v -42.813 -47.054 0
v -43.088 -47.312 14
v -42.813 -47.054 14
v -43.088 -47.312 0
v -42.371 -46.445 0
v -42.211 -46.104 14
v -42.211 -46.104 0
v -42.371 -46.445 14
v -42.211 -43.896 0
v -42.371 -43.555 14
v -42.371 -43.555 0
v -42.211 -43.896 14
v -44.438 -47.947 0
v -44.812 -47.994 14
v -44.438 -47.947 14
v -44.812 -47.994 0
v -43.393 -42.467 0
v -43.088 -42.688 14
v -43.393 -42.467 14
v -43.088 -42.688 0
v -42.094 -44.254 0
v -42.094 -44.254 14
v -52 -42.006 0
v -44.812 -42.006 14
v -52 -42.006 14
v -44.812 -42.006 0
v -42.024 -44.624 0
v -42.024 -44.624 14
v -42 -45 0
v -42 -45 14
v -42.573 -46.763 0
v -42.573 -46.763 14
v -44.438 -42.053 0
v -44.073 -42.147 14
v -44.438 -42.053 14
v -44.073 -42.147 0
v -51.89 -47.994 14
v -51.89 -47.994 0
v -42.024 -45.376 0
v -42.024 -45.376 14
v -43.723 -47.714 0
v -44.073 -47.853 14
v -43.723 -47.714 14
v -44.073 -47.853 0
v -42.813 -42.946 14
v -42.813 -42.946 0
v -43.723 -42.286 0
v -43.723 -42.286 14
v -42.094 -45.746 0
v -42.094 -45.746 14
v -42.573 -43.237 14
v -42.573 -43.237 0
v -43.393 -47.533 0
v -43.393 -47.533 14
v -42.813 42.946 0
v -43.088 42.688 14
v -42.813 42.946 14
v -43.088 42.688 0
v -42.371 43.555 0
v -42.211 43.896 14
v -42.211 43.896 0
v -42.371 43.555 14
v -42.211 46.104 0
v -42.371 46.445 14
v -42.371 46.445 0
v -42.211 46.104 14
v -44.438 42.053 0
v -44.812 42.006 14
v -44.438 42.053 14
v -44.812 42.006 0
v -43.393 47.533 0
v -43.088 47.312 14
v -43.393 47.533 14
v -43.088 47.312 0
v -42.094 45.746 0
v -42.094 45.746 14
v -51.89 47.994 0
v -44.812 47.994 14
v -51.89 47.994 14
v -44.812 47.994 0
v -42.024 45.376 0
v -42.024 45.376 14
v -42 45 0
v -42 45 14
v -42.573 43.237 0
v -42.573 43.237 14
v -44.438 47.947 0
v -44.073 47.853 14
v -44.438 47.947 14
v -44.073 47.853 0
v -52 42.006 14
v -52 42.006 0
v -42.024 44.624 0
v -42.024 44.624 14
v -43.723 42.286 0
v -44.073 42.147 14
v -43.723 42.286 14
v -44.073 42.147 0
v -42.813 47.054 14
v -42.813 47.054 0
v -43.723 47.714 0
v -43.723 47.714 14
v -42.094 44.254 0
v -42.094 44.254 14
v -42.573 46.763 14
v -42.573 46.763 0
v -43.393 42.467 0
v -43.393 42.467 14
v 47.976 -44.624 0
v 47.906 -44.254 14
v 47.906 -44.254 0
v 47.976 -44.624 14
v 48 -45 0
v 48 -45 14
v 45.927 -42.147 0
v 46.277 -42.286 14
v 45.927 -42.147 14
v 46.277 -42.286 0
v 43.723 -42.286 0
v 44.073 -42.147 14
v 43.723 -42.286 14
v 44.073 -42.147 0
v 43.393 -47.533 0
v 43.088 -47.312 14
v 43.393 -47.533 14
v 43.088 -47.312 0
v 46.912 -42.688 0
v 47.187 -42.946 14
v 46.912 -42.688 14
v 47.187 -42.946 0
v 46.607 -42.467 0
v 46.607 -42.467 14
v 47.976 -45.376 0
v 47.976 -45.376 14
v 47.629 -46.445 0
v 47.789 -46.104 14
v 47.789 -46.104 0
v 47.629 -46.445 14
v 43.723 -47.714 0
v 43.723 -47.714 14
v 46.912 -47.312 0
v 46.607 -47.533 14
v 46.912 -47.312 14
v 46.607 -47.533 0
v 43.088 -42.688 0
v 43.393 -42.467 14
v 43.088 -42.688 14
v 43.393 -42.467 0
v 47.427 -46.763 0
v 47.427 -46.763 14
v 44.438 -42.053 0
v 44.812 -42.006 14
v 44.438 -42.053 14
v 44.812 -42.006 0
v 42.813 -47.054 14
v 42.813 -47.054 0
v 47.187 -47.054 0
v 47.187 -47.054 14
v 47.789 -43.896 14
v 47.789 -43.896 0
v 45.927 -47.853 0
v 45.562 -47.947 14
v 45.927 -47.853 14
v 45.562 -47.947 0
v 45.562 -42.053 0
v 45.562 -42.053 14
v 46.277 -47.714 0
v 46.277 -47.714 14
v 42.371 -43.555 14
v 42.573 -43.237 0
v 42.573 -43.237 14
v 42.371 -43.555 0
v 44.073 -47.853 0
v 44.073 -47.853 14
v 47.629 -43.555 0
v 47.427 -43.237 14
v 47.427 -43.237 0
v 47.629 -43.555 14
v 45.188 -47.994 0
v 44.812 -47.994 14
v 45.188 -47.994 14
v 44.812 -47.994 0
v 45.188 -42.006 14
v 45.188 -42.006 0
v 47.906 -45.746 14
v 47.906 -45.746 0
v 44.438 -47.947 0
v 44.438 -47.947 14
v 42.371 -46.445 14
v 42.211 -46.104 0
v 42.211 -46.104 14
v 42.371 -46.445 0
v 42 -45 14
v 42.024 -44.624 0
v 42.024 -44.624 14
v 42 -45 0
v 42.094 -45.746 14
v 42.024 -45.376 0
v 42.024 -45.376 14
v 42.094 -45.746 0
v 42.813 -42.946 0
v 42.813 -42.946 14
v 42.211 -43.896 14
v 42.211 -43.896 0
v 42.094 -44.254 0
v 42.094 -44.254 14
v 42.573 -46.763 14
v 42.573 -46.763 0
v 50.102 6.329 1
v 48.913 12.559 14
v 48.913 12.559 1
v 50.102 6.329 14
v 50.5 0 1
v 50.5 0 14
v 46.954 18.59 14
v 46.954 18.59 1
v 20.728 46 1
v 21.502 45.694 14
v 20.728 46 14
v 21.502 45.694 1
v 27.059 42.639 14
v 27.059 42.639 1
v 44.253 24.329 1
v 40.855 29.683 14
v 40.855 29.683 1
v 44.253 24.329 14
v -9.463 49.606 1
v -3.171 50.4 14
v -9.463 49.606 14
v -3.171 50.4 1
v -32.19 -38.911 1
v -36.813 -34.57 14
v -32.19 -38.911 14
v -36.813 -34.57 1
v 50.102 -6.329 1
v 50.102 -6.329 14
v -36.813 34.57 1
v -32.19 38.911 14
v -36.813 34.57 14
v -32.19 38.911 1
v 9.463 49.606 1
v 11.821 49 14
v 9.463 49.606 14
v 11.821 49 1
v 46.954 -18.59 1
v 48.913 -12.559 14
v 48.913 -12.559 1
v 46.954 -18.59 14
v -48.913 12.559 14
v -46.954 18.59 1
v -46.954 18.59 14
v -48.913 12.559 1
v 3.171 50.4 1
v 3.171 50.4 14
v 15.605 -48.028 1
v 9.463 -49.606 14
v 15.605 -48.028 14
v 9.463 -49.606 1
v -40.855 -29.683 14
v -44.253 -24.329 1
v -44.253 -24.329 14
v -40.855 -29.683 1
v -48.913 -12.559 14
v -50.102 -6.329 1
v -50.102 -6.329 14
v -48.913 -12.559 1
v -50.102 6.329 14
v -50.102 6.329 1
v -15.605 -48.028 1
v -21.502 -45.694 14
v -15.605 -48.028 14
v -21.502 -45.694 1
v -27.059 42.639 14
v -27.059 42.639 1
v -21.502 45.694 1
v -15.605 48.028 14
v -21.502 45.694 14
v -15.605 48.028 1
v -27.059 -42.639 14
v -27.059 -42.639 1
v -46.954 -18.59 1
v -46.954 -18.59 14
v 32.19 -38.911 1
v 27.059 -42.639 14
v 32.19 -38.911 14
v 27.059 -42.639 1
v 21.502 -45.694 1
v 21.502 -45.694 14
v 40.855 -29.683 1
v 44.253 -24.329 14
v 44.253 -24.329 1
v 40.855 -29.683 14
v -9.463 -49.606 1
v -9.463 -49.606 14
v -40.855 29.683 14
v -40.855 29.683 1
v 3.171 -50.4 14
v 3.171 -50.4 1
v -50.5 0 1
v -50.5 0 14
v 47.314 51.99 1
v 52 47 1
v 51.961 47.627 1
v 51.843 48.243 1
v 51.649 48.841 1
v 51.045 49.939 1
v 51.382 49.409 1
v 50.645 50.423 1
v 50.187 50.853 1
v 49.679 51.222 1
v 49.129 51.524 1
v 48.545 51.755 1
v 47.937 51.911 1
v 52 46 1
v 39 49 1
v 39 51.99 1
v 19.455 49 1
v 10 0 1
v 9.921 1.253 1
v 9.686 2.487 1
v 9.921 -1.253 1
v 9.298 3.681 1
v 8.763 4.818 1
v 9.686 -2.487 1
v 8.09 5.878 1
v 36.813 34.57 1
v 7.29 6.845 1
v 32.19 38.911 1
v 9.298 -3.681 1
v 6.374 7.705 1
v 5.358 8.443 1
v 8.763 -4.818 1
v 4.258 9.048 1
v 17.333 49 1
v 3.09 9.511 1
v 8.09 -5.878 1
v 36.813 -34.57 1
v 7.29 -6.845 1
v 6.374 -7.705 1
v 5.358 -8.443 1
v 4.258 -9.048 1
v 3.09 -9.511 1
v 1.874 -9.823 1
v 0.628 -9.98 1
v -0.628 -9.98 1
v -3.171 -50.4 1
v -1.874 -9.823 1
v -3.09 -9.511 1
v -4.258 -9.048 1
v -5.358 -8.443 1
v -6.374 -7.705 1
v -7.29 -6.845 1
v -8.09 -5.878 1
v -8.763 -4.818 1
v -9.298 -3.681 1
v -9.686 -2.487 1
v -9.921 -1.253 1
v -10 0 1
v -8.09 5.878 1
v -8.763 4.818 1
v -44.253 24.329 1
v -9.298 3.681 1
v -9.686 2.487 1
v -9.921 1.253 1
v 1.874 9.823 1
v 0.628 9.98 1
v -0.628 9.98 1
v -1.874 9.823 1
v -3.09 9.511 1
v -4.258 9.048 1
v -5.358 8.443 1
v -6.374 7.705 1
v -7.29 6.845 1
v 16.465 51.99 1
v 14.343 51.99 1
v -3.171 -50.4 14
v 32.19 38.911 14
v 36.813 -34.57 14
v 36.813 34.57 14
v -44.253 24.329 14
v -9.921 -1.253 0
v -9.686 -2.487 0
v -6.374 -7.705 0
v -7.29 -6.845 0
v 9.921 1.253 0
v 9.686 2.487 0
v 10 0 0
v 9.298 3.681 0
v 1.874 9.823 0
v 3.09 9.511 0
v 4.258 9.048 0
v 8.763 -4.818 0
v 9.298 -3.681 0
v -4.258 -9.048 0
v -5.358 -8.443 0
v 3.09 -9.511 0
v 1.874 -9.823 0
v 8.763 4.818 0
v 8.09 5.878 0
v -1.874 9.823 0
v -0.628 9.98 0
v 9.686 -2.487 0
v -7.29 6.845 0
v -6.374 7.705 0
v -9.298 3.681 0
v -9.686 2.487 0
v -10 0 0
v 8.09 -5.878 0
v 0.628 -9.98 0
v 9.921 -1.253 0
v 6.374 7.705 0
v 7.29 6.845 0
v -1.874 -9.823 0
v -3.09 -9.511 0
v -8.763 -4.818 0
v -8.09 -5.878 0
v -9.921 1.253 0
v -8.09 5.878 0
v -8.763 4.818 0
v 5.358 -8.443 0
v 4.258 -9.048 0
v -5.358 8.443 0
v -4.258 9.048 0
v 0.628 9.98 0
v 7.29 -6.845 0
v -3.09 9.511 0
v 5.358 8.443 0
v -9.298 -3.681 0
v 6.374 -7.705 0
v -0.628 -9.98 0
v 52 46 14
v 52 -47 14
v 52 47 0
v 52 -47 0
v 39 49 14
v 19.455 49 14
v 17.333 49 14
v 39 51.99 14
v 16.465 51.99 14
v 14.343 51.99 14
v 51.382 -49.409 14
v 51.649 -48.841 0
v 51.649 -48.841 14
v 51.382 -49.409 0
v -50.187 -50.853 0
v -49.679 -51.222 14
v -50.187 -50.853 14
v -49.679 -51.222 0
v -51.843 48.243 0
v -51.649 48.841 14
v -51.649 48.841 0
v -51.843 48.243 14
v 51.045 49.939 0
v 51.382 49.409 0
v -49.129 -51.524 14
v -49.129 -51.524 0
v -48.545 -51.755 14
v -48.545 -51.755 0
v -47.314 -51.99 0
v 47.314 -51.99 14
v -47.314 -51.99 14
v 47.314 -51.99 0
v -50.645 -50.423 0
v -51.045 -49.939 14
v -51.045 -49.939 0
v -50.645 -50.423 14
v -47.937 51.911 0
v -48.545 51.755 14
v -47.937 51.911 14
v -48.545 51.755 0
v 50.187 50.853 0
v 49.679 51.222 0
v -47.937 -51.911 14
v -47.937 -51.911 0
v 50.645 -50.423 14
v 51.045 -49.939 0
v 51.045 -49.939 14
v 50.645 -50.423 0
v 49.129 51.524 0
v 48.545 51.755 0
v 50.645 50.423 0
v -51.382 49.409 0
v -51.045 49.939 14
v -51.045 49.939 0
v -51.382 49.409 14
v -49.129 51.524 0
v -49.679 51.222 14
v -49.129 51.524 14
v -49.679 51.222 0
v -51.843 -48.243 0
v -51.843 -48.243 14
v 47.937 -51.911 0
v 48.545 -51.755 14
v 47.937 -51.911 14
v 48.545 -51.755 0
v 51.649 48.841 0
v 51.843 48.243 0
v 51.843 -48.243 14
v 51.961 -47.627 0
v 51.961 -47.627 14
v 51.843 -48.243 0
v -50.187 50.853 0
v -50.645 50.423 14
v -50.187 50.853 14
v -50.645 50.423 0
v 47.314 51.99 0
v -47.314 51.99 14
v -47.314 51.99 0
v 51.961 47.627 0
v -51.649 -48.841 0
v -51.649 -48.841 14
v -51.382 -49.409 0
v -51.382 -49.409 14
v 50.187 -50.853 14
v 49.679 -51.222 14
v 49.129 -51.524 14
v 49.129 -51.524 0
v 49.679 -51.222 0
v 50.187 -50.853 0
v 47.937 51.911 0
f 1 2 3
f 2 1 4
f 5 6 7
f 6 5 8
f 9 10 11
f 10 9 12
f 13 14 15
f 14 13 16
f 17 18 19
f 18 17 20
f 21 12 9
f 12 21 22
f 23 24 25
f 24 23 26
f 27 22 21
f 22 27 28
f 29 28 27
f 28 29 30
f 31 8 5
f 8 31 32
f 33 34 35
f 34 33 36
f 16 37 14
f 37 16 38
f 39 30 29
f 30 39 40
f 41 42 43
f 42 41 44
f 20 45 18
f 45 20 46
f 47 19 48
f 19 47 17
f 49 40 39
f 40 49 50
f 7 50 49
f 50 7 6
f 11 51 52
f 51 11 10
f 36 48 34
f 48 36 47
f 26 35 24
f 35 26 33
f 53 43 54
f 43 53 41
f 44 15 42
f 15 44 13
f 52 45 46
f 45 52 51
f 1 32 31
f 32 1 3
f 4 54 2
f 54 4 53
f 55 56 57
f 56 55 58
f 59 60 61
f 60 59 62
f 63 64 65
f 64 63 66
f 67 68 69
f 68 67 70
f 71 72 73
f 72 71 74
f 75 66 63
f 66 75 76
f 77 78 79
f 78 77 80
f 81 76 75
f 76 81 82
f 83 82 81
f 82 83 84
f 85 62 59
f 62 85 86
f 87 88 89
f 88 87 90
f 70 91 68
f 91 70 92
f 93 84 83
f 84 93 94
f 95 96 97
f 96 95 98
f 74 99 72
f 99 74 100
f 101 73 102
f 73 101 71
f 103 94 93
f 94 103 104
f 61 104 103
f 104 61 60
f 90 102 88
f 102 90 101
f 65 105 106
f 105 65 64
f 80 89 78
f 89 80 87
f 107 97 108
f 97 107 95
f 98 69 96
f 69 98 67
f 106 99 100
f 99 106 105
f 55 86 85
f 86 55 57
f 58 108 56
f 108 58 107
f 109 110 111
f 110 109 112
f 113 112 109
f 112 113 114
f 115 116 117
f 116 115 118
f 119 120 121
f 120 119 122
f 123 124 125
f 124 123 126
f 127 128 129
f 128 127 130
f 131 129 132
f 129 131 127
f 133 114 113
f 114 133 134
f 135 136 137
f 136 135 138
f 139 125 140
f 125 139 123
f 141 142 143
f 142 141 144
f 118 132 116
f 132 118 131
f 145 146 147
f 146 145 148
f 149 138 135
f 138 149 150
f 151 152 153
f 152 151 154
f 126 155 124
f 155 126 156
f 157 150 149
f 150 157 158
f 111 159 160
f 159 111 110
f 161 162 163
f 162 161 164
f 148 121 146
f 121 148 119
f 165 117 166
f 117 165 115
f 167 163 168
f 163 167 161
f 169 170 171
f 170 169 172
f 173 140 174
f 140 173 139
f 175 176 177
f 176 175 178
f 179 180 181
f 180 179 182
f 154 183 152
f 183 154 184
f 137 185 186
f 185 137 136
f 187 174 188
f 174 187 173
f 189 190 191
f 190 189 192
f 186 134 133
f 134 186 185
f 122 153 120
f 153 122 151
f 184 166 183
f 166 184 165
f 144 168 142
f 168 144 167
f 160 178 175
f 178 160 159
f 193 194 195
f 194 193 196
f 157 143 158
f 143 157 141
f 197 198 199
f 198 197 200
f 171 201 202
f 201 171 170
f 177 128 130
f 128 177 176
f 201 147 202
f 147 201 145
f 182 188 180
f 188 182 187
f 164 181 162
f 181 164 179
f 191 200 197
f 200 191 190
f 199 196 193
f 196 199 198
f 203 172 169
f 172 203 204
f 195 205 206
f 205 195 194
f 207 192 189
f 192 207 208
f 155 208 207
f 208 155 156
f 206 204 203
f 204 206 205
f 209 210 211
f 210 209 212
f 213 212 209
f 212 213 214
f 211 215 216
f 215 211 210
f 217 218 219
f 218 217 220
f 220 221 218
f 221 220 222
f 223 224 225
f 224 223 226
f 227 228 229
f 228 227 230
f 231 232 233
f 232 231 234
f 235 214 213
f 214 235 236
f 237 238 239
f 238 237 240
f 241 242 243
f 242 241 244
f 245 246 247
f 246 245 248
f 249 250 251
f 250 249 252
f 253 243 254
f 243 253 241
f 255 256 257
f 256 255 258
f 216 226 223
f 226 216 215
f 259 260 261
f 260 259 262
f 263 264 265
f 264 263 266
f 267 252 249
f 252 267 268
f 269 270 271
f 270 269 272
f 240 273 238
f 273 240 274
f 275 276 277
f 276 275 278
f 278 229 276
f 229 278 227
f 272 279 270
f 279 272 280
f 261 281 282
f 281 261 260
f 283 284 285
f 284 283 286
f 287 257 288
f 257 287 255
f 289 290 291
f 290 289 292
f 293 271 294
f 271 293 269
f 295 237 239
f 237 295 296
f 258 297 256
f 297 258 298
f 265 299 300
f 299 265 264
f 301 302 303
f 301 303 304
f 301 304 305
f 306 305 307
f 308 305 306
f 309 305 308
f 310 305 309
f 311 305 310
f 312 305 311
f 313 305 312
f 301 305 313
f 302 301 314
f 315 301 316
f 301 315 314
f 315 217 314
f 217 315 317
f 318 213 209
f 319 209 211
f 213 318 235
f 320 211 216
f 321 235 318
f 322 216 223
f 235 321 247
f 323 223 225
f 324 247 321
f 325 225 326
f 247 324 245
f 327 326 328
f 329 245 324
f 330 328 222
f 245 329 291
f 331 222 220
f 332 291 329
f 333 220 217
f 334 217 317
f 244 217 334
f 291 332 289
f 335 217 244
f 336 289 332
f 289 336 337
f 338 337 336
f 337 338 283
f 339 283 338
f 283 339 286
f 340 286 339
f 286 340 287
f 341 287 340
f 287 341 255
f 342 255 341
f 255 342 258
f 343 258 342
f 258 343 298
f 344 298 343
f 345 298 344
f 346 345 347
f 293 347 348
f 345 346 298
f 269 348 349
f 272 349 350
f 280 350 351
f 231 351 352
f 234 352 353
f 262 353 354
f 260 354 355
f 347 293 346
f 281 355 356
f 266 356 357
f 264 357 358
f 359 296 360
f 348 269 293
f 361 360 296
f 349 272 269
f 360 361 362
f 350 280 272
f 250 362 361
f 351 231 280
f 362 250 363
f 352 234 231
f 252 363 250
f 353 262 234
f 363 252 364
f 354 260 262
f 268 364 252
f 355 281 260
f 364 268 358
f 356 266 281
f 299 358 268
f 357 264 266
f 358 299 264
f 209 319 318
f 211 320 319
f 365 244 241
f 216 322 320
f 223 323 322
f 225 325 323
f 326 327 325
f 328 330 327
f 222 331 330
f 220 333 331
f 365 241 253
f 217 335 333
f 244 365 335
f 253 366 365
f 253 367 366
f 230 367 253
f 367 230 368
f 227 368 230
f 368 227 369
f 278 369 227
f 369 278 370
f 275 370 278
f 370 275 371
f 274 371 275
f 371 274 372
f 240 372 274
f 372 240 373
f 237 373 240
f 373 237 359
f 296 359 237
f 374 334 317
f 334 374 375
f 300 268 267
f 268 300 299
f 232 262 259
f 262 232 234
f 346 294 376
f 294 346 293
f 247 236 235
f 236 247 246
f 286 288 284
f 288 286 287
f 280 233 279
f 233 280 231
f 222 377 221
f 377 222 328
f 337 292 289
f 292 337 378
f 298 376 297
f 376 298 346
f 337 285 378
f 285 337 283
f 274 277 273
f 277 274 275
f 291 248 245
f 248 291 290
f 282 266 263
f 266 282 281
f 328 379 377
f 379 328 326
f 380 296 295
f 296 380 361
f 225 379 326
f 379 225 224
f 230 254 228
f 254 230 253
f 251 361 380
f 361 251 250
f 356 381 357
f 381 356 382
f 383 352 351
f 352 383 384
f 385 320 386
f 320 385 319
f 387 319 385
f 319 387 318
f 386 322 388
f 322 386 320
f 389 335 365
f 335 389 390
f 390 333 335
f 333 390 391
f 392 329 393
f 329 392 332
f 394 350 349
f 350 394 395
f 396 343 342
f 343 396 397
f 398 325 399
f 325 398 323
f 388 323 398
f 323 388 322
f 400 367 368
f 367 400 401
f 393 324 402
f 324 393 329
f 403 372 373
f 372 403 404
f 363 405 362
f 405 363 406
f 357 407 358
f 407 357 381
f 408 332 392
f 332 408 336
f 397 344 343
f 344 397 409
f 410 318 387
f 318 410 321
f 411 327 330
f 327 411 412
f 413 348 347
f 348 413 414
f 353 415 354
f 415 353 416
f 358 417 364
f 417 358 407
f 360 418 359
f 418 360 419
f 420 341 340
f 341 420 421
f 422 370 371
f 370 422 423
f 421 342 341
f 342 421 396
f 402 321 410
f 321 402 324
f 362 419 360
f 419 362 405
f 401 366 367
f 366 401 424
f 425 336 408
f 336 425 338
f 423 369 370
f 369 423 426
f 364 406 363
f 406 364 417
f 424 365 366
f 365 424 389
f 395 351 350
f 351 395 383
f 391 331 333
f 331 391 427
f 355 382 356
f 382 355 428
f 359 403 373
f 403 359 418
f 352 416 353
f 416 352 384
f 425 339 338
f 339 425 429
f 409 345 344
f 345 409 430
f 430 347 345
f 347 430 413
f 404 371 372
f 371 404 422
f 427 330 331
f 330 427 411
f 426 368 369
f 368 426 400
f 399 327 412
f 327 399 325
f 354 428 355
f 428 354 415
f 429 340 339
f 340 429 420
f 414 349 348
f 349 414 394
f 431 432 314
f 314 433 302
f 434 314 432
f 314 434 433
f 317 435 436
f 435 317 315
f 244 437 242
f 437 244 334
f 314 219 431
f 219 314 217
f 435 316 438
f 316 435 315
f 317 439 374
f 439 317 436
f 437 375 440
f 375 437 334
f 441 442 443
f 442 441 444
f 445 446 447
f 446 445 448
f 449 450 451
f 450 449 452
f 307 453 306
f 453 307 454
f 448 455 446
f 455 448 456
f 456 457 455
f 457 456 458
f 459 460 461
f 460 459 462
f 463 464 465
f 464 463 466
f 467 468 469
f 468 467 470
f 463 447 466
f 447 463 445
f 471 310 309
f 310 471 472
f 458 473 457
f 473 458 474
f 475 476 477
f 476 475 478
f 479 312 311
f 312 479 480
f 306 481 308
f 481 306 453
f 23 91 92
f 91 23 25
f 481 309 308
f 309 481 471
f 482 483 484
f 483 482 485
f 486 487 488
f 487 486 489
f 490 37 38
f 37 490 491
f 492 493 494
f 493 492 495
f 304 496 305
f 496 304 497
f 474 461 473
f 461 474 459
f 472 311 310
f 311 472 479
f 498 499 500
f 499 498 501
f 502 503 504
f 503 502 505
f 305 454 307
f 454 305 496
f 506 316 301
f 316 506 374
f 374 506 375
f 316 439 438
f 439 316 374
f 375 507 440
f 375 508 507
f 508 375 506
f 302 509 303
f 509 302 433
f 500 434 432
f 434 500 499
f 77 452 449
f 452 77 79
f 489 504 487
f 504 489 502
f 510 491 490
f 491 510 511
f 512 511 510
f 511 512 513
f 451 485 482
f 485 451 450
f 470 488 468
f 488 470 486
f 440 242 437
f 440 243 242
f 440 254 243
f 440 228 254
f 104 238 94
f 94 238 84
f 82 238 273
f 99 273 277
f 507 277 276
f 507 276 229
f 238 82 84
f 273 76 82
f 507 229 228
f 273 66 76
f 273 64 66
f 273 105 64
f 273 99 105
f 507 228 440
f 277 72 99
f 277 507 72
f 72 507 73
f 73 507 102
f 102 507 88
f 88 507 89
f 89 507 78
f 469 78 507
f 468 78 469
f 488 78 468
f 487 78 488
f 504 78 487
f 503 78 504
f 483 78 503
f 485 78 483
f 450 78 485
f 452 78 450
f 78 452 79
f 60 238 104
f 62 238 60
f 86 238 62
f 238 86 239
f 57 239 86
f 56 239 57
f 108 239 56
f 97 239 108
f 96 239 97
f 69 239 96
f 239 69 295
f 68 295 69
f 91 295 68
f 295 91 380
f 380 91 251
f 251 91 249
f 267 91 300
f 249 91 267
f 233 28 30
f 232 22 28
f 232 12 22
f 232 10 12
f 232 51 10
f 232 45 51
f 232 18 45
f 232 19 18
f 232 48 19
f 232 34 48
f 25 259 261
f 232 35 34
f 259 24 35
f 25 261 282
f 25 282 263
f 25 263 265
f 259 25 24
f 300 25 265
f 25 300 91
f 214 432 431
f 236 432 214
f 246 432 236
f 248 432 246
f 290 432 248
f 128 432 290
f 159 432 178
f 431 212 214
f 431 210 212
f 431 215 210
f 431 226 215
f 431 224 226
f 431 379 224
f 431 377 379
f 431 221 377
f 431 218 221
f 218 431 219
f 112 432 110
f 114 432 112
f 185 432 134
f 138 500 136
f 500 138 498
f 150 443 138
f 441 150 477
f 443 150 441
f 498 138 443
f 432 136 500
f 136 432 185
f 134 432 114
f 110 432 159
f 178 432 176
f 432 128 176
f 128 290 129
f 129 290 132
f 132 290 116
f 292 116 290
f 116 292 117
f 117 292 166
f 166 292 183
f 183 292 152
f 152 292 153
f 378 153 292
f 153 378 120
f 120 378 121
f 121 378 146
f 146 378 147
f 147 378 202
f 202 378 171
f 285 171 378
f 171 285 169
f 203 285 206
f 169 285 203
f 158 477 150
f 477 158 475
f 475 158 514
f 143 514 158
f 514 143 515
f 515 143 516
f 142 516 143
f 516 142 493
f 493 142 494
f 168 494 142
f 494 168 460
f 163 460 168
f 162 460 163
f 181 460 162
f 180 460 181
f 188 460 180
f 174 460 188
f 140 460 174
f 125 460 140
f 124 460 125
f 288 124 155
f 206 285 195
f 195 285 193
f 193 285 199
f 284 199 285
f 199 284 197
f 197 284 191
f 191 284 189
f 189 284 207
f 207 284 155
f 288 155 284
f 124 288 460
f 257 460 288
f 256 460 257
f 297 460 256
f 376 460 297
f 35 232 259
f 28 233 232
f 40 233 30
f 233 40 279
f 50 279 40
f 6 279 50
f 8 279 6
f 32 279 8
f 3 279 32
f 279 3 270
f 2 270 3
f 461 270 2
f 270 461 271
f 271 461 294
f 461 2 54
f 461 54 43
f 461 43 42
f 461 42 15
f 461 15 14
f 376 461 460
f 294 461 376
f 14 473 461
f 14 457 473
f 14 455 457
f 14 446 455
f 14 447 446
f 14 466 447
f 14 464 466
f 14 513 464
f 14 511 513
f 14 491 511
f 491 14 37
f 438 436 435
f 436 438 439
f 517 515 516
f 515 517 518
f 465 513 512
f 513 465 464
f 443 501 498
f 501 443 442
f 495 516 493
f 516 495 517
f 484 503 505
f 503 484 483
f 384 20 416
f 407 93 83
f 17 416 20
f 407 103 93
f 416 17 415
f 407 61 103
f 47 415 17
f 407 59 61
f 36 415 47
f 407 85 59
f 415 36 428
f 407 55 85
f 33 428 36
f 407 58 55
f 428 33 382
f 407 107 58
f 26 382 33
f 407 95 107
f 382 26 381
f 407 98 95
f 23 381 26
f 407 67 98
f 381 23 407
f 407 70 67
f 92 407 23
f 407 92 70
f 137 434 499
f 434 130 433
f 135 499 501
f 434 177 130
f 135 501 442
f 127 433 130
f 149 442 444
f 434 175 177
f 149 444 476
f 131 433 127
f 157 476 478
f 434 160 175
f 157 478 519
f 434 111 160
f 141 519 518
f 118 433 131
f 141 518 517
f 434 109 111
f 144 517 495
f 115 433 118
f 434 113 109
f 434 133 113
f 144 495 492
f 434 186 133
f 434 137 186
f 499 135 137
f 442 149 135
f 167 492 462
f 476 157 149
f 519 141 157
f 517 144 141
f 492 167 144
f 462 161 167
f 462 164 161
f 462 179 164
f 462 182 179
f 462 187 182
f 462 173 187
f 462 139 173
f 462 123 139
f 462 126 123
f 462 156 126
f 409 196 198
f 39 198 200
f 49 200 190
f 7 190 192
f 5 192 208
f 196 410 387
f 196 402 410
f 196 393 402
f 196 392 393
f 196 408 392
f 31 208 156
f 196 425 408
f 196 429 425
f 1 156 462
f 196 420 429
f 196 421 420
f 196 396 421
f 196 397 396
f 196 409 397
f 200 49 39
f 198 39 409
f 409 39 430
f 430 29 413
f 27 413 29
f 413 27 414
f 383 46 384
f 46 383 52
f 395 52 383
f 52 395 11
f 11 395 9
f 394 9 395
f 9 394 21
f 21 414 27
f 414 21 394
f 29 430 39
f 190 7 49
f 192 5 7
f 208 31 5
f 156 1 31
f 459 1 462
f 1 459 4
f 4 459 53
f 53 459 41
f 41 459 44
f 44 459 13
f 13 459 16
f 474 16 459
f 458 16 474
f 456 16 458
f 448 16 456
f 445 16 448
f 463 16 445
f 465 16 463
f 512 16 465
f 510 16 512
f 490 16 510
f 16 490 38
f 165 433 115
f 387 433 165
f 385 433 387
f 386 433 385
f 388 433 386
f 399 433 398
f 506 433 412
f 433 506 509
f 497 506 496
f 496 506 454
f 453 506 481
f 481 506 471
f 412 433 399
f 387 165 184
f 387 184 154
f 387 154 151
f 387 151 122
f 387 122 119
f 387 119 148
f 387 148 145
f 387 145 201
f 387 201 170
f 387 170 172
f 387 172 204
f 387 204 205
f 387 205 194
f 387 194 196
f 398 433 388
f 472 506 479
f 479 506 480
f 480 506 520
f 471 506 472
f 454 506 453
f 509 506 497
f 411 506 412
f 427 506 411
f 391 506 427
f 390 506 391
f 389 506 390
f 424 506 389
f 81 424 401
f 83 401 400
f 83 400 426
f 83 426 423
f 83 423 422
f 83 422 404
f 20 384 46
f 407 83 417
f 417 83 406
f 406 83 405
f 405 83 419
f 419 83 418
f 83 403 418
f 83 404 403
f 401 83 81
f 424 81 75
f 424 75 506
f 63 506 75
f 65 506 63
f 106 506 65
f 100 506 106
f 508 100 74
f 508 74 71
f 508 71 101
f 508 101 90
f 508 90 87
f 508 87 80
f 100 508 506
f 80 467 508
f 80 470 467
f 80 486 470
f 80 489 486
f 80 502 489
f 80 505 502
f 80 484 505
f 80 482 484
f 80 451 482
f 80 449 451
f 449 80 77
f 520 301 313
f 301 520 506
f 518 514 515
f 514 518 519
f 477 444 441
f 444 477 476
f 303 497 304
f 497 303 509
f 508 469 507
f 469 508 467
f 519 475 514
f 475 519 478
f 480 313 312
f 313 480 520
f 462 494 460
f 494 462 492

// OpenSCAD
$fn = 50;


difference() {
	union() {
		translate(v = [0, 0, 0]) {
			rotate(a = [0, 0, 0]) {
				hull() {
					translate(v = [-47.0000000000, 47.0000000000, 0]) {
						rotate(a = [0, 0, 0]) {
							translate(v = [0, 0, 0]) {
								rotate(a = [0, 0, 0]) {
									cylinder(h = 14, r = 5);
								}
							}
						}
					}
					translate(v = [47.0000000000, 47.0000000000, 0]) {
						rotate(a = [0, 0, 0]) {
							translate(v = [0, 0, 0]) {
								rotate(a = [0, 0, 0]) {
									cylinder(h = 14, r = 5);
								}
							}
						}
					}
					translate(v = [-47.0000000000, -47.0000000000, 0]) {
						rotate(a = [0, 0, 0]) {
							translate(v = [0, 0, 0]) {
								rotate(a = [0, 0, 0]) {
									cylinder(h = 14, r = 5);
								}
							}
						}
					}
					translate(v = [47.0000000000, -47.0000000000, 0]) {
						rotate(a = [0, 0, 0]) {
							translate(v = [0, 0, 0]) {
								rotate(a = [0, 0, 0]) {
									cylinder(h = 14, r = 5);
								}
							}
						}
					}
				}
			}
		}
	}
	union() {
		translate(v = [-52.5000000000, -45.0000000000, -125]) {
			rotate(a = [0, 0, 0]) {
				hull() {
					translate(v = [7.5000000000, 0, 0]) {
						rotate(a = [0, 0, 0]) {
							translate(v = [0, 0, 0]) {
								rotate(a = [0, 0, 0]) {
									cylinder(h = 250, r = 3.0000000000);
								}
							}
						}
					}
					translate(v = [-7.5000000000, 0, 0]) {
						rotate(a = [0, 0, 0]) {
							translate(v = [0, 0, 0]) {
								rotate(a = [0, 0, 0]) {
									cylinder(h = 250, r = 3.0000000000);
								}
							}
						}
					}
				}
			}
		}
		translate(v = [-52.5000000000, 45.0000000000, -125]) {
			rotate(a = [0, 0, 0]) {
				hull() {
					translate(v = [7.5000000000, 0, 0]) {
						rotate(a = [0, 0, 0]) {
							translate(v = [0, 0, 0]) {
								rotate(a = [0, 0, 0]) {
									cylinder(h = 250, r = 3.0000000000);
								}
							}
						}
					}
					translate(v = [-7.5000000000, 0, 0]) {
						rotate(a = [0, 0, 0]) {
							translate(v = [0, 0, 0]) {
								rotate(a = [0, 0, 0]) {
									cylinder(h = 250, r = 3.0000000000);
								}
							}
						}
					}
				}
			}
		}
		translate(v = [45.0000000000, -45.0000000000, -125.0000000000]) {
			rotate(a = [0, 0, 0]) {
				cylinder(h = 250, r = 3.0000000000);
			}
		}
		translate(v = [0, 0, 1.0000000000]) {
			rotate(a = [0, 0, 0]) {
				cylinder(h = 16, r = 50.5000000000);
			}
		}
		translate(v = [0, 0, -7.0000000000]) {
			rotate(a = [0, 0, 0]) {
				cylinder(h = 14, r = 10.0000000000);
			}
		}
		translate(v = [0.0000000000, 46.0000000000, 1]) {
			rotate(a = [0, 0, 0]) {
				cube(size = [52.0000000000, 3, 16]);
			}
		}
		translate(v = [39.0000000000, 46.0000000000, 1]) {
			rotate(a = [0, 0, 0]) {
				cube(size = [13.0000000000, 6, 16]);
			}
		}
		translate(v = [13.5833333333, 52.7500000000, 1]) {
			rotate(a = [0, 0, -45]) {
				cube(size = [7.5000000000, 1.5000000000, 16]);
			}
		}
	}
}
